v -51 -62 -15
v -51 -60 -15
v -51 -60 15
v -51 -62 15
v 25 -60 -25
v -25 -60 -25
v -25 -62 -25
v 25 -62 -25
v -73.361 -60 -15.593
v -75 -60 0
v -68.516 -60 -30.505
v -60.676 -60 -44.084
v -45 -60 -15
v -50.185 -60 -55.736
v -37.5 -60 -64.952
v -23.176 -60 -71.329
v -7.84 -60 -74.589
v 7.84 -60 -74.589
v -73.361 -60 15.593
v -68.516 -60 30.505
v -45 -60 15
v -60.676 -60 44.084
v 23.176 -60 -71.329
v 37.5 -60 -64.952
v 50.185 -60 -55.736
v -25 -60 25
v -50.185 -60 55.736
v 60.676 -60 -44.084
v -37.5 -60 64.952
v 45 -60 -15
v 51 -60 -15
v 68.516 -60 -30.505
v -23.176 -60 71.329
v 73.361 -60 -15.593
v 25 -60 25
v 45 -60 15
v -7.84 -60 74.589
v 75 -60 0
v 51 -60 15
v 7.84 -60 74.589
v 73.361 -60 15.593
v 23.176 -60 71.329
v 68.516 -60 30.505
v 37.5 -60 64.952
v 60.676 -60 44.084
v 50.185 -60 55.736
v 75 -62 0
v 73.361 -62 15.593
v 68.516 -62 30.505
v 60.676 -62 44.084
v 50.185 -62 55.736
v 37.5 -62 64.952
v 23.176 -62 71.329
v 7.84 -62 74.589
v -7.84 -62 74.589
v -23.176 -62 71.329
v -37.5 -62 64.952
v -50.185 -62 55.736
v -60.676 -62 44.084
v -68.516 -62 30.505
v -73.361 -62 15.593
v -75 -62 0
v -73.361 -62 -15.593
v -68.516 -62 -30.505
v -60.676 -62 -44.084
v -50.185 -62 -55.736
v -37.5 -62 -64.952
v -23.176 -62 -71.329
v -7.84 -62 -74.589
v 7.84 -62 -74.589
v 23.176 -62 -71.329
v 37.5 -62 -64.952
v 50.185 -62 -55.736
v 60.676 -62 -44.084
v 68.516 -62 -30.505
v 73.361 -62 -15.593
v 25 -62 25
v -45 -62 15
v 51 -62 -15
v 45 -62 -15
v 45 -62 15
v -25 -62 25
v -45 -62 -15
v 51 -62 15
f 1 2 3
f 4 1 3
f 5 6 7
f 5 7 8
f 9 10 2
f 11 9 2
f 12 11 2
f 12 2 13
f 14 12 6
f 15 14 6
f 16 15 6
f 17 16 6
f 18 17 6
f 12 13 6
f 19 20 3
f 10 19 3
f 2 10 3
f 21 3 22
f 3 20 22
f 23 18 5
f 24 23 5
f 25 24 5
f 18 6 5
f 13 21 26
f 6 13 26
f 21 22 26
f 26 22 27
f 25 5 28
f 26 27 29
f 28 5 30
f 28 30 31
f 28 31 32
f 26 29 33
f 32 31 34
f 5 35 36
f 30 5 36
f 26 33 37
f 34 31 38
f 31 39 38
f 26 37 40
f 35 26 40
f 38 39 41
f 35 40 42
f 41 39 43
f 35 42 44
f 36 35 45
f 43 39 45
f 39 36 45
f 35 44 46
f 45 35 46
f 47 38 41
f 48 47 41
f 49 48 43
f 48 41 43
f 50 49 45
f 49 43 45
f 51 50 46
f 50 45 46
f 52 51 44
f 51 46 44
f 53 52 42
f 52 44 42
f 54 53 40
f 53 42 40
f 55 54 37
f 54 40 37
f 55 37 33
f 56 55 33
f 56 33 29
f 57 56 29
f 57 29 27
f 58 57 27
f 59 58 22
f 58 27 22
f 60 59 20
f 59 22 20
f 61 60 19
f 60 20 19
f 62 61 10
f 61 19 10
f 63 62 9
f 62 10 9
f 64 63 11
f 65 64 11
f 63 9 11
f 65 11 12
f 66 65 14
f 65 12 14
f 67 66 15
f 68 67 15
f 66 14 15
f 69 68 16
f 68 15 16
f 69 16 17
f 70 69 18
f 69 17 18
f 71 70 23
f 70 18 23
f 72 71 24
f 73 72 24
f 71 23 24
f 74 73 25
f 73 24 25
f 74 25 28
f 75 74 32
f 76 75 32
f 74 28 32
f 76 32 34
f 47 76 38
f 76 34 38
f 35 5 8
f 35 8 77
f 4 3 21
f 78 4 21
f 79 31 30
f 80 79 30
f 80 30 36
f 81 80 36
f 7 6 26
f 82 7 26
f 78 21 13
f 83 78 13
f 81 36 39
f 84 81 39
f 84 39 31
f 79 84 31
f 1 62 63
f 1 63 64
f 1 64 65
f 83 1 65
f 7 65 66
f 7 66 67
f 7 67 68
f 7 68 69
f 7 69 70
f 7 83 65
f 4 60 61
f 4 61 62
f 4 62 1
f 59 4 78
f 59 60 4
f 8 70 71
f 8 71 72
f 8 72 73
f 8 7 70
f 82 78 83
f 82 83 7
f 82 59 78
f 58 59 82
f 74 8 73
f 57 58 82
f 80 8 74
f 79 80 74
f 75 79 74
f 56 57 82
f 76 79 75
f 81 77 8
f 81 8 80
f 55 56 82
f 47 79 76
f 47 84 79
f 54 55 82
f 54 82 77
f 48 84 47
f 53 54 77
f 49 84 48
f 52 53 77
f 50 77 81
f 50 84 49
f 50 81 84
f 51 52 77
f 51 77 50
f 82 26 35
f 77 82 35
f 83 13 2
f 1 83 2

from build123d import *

# Parameters (mm, degrees)
F2_R     = 75
F2_W     = 50
F2_H     = 50
F3_DEPTH = 2


# Not quite as in the source:
# - a feature of the source that left no trace in its solid (it failed there, or was rolled back) is left out


with BuildPart() as f3:
    # F2 (on offset) → F3 (new body)
    with BuildSketch(Plane.XZ.offset(60)):
        Circle(F2_R)
        Polygon((-45, 15), (-45, 0), (-45, -15), (-51, -15), (-51, 15), align=None, mode=Mode.SUBTRACT)
        Rectangle(F2_W, F2_H, mode=Mode.SUBTRACT)
        Polygon((45, -15), (45, 0), (45, 15), (51, 15), (51, -15), align=None, mode=Mode.SUBTRACT)
    extrude(amount=F3_DEPTH)


solid = f3.part
